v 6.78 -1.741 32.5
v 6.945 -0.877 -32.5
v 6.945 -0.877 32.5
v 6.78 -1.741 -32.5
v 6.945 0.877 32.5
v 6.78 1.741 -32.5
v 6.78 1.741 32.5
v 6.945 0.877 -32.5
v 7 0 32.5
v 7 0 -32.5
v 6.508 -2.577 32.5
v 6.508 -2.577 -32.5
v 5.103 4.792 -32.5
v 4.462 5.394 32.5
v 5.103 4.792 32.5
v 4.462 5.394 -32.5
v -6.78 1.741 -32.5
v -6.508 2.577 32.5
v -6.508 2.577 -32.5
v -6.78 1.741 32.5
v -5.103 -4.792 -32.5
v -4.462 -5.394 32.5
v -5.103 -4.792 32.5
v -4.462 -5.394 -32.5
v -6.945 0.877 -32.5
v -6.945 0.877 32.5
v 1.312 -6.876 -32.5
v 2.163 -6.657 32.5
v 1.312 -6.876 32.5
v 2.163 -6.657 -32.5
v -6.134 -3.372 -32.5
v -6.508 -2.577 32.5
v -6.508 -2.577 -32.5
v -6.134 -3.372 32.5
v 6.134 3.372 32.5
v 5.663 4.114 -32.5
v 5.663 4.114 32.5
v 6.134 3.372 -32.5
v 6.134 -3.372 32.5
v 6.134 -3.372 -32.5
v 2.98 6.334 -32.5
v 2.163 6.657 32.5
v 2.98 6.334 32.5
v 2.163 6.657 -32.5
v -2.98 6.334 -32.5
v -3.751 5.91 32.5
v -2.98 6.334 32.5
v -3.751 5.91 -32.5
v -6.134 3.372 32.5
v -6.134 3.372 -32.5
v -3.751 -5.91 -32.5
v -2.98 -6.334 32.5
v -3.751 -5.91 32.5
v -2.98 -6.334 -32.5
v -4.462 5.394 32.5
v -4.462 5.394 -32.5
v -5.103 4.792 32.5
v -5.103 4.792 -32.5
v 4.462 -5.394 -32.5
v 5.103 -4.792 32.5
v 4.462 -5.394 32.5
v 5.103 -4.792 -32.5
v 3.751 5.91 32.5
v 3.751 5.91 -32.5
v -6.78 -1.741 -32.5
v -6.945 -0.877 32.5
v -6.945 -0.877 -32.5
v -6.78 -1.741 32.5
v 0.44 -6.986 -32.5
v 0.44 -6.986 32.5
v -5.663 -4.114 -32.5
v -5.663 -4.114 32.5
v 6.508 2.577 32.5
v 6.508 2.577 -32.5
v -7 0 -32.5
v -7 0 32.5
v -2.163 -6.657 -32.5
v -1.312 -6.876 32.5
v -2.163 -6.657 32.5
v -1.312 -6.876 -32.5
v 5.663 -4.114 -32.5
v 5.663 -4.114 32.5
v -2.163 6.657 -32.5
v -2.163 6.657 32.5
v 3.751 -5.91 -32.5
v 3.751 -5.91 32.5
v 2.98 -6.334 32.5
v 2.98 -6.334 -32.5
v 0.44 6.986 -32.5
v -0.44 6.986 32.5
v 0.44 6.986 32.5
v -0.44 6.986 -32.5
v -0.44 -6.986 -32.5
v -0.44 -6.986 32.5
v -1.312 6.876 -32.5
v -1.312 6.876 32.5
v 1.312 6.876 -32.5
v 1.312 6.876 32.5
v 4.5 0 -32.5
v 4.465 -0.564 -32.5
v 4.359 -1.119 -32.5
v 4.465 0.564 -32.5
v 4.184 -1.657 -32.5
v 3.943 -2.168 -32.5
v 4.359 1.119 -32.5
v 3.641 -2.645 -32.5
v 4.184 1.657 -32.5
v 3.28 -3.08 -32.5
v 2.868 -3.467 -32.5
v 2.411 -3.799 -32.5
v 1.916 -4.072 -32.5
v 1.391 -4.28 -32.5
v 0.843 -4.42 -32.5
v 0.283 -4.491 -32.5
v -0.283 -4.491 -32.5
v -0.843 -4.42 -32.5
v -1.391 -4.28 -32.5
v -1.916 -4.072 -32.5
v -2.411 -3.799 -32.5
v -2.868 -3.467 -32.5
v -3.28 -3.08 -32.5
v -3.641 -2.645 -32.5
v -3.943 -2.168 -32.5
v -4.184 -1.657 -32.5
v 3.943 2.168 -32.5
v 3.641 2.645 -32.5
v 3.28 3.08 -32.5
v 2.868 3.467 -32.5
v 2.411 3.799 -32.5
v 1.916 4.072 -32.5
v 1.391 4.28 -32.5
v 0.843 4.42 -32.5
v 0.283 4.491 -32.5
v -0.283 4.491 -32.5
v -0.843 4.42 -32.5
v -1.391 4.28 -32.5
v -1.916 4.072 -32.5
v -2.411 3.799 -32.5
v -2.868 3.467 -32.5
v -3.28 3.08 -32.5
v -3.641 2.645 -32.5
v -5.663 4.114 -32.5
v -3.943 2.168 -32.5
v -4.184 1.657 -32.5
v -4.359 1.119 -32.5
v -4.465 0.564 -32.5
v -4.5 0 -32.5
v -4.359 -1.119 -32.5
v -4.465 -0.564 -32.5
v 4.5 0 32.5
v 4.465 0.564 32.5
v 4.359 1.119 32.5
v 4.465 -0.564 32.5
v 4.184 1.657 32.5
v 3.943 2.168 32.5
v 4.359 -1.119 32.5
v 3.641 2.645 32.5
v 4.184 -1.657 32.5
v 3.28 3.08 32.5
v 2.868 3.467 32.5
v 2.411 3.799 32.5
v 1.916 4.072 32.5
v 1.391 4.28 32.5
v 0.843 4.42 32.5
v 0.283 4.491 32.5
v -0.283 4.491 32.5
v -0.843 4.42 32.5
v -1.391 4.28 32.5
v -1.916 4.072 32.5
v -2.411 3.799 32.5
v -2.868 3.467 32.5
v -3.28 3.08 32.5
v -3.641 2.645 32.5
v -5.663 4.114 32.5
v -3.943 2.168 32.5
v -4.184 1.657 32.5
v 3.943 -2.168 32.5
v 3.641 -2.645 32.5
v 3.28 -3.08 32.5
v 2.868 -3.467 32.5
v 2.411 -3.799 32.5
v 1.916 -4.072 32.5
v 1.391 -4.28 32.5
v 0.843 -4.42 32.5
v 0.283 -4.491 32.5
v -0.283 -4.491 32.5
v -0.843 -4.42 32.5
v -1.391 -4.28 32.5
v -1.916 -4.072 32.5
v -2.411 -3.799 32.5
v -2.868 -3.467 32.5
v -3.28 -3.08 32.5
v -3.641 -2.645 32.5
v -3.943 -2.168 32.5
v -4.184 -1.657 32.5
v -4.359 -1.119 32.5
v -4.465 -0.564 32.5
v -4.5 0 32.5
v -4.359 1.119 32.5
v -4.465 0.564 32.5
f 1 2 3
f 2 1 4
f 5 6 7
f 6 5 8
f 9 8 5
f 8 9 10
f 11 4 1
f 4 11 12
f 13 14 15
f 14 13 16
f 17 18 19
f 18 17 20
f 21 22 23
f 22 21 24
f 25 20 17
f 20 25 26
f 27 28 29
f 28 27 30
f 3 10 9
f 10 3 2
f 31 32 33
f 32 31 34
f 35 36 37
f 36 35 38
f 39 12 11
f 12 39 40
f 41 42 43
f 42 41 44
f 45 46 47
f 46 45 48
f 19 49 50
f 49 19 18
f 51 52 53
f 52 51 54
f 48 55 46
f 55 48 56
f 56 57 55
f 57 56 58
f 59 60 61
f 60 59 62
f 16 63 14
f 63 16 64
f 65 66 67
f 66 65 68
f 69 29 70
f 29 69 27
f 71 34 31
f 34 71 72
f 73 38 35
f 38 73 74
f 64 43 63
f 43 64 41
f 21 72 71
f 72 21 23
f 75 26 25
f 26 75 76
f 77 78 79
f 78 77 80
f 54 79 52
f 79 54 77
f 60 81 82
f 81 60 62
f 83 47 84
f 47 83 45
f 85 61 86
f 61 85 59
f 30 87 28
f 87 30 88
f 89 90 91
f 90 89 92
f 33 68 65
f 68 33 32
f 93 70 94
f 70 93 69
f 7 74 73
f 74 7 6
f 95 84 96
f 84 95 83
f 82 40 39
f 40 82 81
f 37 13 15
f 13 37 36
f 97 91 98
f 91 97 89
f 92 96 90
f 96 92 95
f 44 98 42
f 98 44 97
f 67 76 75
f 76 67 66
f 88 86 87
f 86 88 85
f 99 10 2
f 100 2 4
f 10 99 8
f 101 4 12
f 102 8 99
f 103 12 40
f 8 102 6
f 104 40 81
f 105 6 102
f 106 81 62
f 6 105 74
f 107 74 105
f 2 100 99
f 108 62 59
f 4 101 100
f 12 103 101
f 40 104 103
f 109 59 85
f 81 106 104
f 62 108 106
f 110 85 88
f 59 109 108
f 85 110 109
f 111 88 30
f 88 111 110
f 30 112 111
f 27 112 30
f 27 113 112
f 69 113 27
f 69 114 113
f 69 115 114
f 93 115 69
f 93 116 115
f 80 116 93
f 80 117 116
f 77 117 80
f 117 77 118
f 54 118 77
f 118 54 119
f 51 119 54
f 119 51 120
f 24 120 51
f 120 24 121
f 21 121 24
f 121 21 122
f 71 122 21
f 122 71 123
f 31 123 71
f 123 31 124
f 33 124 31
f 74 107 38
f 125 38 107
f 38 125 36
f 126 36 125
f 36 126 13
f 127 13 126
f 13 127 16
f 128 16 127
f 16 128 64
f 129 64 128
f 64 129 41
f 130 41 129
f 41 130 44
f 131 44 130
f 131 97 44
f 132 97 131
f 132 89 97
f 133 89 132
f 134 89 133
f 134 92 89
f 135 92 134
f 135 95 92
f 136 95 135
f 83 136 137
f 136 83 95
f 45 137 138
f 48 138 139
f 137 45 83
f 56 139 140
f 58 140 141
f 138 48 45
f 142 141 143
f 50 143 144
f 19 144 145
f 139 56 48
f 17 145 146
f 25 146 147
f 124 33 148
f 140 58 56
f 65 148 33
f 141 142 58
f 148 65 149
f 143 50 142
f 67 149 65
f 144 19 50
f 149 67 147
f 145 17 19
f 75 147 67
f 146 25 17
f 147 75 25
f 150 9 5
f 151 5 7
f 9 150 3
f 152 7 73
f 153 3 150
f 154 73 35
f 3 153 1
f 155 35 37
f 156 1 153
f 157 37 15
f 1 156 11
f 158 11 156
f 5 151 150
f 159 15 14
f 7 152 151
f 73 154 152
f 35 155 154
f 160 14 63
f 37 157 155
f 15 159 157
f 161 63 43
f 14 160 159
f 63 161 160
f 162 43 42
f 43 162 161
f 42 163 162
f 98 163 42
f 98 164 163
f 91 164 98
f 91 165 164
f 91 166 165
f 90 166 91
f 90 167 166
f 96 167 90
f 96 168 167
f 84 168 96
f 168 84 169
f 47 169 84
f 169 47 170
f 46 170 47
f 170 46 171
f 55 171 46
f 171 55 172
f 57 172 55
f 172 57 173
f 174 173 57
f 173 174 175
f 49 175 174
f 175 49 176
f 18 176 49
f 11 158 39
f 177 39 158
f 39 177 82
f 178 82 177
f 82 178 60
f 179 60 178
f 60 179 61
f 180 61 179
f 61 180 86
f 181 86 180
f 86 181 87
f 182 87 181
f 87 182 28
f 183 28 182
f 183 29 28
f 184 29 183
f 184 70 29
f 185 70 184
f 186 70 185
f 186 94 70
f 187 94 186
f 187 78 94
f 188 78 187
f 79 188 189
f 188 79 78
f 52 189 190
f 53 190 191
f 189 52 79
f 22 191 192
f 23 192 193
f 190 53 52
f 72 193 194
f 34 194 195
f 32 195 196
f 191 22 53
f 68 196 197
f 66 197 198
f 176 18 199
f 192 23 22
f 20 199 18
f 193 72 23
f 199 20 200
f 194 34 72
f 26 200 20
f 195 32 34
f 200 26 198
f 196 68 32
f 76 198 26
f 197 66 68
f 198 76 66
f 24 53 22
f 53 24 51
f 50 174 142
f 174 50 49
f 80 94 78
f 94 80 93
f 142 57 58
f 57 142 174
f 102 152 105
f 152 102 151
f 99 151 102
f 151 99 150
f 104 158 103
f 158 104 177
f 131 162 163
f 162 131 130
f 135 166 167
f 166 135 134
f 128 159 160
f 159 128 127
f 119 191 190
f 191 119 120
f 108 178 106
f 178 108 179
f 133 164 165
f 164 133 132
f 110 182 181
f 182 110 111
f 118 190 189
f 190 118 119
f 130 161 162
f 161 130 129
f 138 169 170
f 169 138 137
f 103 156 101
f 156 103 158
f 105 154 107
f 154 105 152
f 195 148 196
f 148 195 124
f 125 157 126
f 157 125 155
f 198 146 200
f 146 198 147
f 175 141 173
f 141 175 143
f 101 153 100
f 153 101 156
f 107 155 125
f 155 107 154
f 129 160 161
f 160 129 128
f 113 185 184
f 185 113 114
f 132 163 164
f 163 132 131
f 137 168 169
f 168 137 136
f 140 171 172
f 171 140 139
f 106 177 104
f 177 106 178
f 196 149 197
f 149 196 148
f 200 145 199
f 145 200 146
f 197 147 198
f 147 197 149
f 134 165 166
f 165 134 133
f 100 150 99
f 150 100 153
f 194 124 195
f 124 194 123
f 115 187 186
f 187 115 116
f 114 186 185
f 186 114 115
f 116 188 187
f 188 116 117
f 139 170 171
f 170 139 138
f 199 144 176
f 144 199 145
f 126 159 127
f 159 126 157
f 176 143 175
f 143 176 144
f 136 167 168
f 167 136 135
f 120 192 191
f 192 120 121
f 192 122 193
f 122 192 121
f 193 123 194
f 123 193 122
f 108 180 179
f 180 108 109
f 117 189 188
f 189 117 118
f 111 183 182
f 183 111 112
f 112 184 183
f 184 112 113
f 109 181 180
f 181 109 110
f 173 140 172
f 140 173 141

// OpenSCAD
$fn = 50;


difference() {
	union() {
		translate(v = [0, 0, -32.5000000000]) {
			cylinder(h = 65, r = 7.0000000000);
		}
	}
	union() {
		translate(v = [0, 0, -100.0000000000]) {
			cylinder(h = 200, r = 4.5000000000);
		}
	}
}
